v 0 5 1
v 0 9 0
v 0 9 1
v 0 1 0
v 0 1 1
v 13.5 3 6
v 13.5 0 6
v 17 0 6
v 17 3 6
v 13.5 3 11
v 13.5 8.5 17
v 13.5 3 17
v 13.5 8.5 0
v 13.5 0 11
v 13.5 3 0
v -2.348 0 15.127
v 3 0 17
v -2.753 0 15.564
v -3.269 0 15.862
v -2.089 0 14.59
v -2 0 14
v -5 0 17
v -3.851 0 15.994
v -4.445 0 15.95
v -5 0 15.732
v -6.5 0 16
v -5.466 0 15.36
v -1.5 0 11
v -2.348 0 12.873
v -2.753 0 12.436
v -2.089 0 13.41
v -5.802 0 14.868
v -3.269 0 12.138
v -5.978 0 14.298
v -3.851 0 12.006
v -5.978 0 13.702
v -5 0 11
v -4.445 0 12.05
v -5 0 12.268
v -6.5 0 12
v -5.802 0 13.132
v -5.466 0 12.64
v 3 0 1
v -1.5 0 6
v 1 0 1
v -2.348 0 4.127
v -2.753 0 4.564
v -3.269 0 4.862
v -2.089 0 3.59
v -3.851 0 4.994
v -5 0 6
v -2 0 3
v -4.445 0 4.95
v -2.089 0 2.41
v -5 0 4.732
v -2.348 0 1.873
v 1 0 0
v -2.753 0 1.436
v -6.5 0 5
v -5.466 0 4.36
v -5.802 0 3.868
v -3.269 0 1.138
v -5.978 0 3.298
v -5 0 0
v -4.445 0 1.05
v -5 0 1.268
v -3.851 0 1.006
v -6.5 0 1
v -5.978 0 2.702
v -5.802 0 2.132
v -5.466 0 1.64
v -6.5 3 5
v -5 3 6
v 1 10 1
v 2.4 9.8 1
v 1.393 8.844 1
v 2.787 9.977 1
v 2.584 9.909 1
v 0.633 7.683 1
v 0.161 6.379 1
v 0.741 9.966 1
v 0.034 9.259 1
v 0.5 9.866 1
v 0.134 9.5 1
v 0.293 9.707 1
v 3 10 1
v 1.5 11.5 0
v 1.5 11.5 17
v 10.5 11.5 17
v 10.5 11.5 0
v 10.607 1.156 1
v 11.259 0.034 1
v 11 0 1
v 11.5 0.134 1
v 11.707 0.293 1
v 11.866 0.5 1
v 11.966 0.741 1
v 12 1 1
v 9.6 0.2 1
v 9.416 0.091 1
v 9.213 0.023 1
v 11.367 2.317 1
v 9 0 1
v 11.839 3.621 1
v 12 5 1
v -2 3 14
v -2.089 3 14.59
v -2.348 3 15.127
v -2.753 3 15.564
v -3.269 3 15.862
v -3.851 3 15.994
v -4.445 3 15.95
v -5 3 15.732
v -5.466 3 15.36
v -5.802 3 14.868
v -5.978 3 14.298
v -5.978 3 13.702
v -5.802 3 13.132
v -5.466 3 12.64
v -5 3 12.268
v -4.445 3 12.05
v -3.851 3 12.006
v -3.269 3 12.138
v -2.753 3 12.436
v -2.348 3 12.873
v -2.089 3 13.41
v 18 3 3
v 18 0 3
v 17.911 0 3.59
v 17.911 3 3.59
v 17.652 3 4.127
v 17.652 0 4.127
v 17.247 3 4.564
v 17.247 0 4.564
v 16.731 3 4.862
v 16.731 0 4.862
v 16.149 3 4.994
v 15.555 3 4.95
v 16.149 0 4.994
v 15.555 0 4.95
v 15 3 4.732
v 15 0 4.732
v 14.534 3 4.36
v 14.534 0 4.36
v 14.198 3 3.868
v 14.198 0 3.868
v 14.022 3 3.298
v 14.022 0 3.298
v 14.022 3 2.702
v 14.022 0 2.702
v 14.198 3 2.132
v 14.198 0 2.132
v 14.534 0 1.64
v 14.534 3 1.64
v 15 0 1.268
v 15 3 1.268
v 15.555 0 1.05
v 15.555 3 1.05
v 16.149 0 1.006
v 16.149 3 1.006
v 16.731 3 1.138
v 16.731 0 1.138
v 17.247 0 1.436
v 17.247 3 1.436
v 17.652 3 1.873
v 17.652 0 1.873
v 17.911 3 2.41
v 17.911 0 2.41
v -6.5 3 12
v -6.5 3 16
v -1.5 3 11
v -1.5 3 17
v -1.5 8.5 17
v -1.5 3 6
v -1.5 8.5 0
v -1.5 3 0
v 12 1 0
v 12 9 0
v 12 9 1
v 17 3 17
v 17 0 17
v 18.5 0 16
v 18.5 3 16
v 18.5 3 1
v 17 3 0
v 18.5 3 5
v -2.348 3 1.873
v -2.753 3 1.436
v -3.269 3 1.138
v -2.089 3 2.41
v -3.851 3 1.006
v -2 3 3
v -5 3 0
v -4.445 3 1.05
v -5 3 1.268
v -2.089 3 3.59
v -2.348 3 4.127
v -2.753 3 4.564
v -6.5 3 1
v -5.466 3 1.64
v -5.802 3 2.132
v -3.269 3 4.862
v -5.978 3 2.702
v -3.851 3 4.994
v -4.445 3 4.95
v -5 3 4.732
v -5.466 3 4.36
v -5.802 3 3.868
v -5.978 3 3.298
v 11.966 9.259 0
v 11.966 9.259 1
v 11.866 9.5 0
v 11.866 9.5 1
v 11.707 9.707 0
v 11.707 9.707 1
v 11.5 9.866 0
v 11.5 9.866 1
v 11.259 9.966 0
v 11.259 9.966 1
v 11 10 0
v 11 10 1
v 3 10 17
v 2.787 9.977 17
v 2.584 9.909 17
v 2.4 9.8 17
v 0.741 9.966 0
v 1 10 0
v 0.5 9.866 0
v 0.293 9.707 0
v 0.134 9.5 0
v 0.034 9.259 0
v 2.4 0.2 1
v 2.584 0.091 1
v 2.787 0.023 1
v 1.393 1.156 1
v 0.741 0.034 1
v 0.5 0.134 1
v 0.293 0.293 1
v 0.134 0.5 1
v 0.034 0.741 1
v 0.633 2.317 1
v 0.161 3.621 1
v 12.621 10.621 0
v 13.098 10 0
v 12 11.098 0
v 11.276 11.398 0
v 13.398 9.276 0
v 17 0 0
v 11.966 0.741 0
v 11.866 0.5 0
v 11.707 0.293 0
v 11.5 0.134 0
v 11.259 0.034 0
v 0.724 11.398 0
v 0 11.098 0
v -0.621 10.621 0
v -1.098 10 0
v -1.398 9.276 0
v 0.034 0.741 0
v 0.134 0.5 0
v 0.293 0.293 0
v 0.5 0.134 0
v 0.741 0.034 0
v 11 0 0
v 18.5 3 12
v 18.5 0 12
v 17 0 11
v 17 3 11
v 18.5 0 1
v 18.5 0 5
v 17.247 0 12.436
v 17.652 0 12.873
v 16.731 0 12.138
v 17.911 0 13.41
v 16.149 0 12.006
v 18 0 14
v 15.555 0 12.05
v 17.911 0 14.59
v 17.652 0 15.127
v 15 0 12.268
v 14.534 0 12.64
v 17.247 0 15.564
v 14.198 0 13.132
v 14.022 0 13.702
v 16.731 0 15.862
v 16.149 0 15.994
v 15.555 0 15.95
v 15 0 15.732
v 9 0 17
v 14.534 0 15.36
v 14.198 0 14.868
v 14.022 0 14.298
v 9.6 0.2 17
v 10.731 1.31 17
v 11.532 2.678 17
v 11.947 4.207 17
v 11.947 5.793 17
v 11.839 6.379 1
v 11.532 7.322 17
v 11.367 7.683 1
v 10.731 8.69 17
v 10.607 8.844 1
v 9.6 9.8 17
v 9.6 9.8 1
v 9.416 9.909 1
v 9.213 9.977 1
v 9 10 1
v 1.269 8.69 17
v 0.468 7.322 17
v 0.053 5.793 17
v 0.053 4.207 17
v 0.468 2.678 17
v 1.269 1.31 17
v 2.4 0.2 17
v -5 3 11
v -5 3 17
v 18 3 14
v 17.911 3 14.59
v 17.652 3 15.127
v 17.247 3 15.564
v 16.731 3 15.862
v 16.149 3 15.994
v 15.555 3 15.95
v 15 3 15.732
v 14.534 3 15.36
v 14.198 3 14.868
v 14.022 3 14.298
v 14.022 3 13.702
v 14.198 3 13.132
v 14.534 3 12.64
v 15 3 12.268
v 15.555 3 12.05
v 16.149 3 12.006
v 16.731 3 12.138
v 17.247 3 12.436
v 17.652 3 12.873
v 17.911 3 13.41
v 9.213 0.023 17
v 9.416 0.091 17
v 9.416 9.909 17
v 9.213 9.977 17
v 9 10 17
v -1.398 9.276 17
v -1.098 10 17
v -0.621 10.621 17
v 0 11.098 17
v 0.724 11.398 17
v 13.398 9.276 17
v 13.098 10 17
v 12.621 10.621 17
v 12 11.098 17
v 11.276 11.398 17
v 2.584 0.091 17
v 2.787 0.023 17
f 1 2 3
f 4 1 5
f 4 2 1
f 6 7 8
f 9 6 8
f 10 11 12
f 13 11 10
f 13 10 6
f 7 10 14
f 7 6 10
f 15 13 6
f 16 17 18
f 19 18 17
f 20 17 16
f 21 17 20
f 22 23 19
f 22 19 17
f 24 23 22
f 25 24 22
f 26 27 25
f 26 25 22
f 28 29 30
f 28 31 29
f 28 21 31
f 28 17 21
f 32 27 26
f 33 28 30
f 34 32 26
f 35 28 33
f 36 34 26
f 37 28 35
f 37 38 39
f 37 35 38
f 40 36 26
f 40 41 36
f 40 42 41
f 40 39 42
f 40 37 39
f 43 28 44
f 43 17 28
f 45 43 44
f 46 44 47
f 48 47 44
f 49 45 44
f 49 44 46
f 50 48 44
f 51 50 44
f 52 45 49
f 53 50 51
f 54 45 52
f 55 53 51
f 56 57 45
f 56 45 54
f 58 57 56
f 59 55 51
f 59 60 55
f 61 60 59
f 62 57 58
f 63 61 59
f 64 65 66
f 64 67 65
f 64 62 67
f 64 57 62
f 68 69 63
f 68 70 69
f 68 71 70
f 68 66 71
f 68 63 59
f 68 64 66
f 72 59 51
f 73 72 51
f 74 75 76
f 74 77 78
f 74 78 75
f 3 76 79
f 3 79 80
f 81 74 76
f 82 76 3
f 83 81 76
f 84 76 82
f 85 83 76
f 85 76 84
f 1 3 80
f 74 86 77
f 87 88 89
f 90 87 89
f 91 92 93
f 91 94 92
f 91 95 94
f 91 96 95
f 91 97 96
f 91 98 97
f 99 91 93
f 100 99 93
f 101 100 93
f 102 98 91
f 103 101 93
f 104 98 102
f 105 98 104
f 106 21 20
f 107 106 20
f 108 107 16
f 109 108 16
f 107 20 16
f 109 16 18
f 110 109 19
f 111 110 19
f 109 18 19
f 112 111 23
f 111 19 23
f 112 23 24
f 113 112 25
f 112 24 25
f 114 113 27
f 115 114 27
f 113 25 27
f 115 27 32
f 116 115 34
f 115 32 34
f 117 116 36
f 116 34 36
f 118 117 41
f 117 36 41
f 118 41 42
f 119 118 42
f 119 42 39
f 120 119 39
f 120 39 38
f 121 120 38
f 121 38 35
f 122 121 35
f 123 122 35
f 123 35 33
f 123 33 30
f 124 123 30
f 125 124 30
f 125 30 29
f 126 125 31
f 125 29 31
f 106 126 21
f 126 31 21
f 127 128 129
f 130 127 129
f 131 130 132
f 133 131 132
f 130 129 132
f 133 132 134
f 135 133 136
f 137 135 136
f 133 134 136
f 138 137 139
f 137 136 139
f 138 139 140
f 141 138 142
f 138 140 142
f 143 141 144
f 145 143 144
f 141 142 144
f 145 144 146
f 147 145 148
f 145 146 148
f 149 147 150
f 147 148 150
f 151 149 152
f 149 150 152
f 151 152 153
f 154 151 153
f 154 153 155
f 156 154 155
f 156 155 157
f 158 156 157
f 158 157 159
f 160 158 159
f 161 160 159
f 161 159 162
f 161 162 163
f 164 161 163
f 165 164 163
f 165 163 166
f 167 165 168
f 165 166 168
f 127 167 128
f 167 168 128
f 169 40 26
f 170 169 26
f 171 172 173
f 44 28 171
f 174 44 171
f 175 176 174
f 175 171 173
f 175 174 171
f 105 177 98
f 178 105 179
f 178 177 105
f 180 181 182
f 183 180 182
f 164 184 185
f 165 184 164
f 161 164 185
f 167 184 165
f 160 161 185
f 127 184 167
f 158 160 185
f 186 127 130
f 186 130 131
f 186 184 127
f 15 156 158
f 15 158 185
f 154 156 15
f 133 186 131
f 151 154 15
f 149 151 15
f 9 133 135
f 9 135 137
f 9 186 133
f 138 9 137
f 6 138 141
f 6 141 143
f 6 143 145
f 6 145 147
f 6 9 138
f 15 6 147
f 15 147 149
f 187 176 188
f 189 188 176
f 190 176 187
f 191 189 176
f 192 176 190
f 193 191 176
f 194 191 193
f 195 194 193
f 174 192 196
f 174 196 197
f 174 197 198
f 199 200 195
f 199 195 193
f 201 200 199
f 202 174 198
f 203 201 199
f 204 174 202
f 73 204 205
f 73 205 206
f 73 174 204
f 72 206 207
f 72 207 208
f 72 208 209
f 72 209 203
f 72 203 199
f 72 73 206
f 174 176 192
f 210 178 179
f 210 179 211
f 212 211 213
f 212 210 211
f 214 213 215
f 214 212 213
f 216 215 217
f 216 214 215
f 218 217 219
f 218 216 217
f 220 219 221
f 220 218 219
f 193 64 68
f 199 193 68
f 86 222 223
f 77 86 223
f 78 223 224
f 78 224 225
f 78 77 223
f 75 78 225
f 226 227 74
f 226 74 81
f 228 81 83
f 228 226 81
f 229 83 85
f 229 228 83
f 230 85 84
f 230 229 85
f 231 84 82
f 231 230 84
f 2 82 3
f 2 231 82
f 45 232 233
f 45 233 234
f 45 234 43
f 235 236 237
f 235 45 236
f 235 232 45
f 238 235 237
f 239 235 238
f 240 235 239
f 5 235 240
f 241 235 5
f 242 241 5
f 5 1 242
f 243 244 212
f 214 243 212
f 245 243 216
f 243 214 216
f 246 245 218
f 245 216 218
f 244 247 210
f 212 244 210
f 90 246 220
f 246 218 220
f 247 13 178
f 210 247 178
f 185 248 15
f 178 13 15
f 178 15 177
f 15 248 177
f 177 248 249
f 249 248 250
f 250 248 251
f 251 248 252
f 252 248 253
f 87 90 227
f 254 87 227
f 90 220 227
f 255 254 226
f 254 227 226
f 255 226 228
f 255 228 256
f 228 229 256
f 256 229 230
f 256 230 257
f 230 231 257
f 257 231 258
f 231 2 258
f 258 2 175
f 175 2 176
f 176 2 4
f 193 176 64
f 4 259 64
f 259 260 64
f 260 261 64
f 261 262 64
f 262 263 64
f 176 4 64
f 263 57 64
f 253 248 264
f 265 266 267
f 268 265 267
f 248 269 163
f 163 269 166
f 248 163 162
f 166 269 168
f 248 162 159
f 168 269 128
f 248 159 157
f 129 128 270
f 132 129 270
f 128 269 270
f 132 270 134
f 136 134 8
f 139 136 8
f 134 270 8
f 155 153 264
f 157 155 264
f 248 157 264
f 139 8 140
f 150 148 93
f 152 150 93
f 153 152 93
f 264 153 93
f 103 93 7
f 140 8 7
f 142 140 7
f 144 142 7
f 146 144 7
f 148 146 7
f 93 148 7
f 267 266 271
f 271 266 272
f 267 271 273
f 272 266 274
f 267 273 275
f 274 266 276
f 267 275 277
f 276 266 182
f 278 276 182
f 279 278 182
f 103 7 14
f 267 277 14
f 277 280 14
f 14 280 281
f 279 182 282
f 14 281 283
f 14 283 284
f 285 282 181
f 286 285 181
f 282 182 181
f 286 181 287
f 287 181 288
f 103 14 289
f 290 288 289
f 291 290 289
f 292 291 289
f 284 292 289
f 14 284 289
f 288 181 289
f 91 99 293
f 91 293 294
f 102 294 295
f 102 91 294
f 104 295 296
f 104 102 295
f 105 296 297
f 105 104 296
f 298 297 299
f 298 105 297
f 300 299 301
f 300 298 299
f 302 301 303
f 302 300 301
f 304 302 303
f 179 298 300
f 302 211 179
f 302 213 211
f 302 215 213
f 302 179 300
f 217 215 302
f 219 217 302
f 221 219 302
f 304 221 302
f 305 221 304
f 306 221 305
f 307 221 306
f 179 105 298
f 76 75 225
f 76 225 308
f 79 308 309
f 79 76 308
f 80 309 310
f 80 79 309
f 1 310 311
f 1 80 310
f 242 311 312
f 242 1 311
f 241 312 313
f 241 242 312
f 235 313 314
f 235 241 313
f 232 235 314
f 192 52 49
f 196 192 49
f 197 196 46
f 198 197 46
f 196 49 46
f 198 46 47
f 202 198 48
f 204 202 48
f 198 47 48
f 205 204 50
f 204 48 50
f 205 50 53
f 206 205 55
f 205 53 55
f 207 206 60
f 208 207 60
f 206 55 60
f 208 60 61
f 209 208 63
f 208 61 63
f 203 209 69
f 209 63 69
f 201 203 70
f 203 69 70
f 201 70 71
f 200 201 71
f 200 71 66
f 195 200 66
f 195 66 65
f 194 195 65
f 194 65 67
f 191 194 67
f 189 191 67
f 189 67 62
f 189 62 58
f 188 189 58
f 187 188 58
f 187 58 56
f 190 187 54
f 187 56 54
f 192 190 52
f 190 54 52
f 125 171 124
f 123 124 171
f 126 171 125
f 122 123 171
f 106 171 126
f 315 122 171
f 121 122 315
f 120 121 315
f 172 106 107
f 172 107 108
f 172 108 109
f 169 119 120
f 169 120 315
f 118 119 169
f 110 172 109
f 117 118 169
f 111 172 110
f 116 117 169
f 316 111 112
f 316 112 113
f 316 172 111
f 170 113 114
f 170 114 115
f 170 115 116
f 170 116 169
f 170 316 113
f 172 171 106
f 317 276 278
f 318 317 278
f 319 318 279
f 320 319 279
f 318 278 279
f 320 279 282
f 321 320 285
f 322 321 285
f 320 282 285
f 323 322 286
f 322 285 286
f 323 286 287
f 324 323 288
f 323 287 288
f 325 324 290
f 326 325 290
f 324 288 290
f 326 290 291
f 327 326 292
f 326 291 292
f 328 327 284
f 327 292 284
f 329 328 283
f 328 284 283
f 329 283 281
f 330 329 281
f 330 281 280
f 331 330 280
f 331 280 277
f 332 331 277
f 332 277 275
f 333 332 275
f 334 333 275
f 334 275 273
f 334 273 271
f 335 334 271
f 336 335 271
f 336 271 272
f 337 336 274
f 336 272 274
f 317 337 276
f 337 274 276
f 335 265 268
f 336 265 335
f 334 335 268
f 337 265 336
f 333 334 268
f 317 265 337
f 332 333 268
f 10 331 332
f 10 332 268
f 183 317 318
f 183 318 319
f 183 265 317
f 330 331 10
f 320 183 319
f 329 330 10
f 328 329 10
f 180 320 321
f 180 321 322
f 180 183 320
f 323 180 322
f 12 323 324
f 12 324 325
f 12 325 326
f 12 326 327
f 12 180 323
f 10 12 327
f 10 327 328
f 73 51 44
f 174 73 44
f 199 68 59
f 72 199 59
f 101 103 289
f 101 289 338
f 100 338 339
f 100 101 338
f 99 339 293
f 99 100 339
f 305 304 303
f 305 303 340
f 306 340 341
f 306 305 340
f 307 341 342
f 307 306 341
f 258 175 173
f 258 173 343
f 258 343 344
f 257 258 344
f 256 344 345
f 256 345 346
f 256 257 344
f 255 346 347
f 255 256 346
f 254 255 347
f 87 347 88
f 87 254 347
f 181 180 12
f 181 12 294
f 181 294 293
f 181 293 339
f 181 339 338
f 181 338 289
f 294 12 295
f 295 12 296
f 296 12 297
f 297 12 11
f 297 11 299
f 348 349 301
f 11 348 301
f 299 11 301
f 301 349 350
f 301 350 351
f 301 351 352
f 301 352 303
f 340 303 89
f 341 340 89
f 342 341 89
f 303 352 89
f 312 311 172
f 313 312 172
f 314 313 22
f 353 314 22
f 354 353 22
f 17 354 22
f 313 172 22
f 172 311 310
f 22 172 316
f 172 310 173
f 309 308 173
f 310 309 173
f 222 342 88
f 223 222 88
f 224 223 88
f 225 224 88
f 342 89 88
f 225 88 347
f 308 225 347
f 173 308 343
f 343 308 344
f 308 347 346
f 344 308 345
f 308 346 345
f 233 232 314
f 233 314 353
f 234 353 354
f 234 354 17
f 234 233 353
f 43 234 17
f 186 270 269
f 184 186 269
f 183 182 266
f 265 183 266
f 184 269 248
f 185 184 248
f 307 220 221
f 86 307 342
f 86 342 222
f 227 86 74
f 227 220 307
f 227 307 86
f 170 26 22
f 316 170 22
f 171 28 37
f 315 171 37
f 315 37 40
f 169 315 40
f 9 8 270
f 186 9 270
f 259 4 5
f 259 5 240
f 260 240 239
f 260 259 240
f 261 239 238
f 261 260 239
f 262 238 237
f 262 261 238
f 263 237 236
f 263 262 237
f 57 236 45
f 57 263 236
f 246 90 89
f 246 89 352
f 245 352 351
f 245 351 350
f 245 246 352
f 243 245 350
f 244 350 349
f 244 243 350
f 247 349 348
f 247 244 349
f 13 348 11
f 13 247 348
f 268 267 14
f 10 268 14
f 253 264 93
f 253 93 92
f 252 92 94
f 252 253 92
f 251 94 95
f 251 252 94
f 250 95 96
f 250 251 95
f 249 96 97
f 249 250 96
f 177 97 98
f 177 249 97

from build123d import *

# Parameters (mm, degrees)
Y_KSEKLIK_EKSTR_ZYON1_DEPTH = 1
Y_KSEKLIK_EKSTR_ZYON2_DEPTH = 16
IZIM4_R                     = 2
Y_KSEKLIK_EKSTR_ZYON3_DEPTH = 3


with BuildPart() as part:
    # Çizim1 → Yükseklik-Ekstrüzyon1 (new body)
    with BuildSketch(Plane.XY):
        with BuildLine():
            Line((12, 1), (12, 9))
            ThreePointArc((12, 9), (11.707106781, 9.707106781), (11, 10))
            Line((11, 10), (1, 10))
            ThreePointArc((1, 10), (0.292893219, 9.707106781), (0, 9))
            Line((0, 9), (0, 1))
            ThreePointArc((0, 1), (0.292893219, 0.292893219), (1, 0))
            Line((1, 0), (-1.5, 0))
            Line((-1.5, 0), (-1.5, 8.5))
            ThreePointArc((-1.5, 8.5), (-0.621320344, 10.621320344), (1.5, 11.5))
            Line((1.5, 11.5), (10.5, 11.5))
            ThreePointArc((10.5, 11.5), (12.621320344, 10.621320344), (13.5, 8.5))
            Line((13.5, 8.5), (13.5, 0))
            Line((13.5, 0), (11, 0))
            ThreePointArc((11, 0), (11.707106781, 0.292893219), (12, 1))
        make_face()
    extrude(amount=Y_KSEKLIK_EKSTR_ZYON1_DEPTH)

    # Çizim3 → Yükseklik-Ekstrüzyon2 (add)
    with BuildSketch(Plane.XY.offset(1)):
        with BuildLine():
            Line((3, 0), (-1.5, 0))
            Line((-1.5, 0), (-1.5, 8.5))
            ThreePointArc((-1.5, 8.5), (-0.621320344, 10.621320344), (1.5, 11.5))
            Line((1.5, 11.5), (10.5, 11.5))
            ThreePointArc((10.5, 11.5), (12.621320344, 10.621320344), (13.5, 8.5))
            Line((13.5, 8.5), (13.5, 0))
            Line((13.5, 0), (9, 0))
            ThreePointArc((9, 0), (9.316227766, 0.051316702), (9.6, 0.2))
            ThreePointArc((9.6, 0.2), (12, 5), (9.6, 9.8))
            ThreePointArc((9.6, 9.8), (9.316227766, 9.948683298), (9, 10))
            Line((9, 10), (3, 10))
            ThreePointArc((3, 10), (2.683772234, 9.948683298), (2.4, 9.8))
            ThreePointArc((2.4, 9.8), (0, 5), (2.4, 0.2))
            ThreePointArc((2.4, 0.2), (2.683772234, 0.051316702), (3, 0))
        make_face()
    extrude(amount=Y_KSEKLIK_EKSTR_ZYON2_DEPTH)

    # Çizim4 → Yükseklik-Ekstrüzyon3 (add)
    with BuildSketch(Plane.XZ):
        Polygon((13.5, 0), (13.5, 6), (17, 6), (18.5, 5), (18.5, 1), (17, 0), align=None)
        with Locations((16, 3)):
            Circle(IZIM4_R, mode=Mode.SUBTRACT)
        Polygon((13.5, 17), (17, 17), (18.5, 16), (18.5, 12), (17, 11), (13.5, 11), align=None)
        with Locations((16, 14)):
            Circle(IZIM4_R, mode=Mode.SUBTRACT)
        Polygon((-1.5, 0), (-5, 0), (-6.5, 1), (-6.5, 5), (-5, 6), (-1.5, 6), align=None)
        with Locations((-4, 3)):
            Circle(IZIM4_R, mode=Mode.SUBTRACT)
        Polygon((-1.5, 17), (-1.5, 11), (-5, 11), (-6.5, 12), (-6.5, 16), (-5, 17), align=None)
        with Locations((-4, 14)):
            Circle(IZIM4_R, mode=Mode.SUBTRACT)
    extrude(amount=-Y_KSEKLIK_EKSTR_ZYON3_DEPTH)


solid = part.part
